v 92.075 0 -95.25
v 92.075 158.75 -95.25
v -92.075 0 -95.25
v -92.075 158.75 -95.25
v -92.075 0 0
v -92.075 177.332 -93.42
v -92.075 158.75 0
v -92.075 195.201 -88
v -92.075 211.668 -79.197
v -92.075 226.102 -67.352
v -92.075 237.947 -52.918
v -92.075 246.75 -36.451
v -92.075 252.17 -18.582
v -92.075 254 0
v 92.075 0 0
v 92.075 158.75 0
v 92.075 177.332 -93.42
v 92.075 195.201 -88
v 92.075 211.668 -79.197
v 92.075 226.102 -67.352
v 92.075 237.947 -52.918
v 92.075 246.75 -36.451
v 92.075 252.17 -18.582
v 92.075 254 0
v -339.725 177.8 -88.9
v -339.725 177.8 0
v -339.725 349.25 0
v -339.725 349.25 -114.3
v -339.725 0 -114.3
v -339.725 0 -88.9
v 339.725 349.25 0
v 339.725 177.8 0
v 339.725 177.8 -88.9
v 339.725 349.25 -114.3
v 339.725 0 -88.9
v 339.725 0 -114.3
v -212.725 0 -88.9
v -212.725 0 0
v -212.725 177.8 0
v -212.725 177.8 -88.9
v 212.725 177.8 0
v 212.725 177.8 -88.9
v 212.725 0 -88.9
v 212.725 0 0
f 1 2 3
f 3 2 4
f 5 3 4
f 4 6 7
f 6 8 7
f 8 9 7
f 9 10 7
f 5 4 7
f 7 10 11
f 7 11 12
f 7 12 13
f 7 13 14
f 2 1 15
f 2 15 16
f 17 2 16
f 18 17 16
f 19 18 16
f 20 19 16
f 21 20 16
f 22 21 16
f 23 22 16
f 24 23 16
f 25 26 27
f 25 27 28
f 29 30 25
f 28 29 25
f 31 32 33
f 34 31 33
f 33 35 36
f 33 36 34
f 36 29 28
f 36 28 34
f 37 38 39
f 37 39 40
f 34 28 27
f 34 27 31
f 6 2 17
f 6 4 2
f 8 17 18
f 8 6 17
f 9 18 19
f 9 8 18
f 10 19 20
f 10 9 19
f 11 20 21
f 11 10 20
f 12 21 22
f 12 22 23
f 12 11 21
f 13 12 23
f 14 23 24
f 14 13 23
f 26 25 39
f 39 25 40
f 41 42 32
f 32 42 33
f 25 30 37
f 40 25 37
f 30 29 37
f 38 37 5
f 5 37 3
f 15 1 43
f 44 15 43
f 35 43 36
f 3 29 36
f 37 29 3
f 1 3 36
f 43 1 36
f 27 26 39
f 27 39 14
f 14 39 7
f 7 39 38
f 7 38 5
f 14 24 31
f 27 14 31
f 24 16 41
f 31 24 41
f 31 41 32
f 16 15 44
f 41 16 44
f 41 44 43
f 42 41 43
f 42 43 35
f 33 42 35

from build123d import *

# Parameters (mm, degrees)
SKETCH1_W           = 679.45
SKETCH1_H           = 114.3
BOSS_EXTRUDE1_DEPTH = 349.25
SKETCH4_W           = 184.15
SKETCH4_H           = 95.25
SKETCH5_W           = 127
SKETCH5_H           = 88.9
CUT_EXTRUDE1_DEPTH  = 177.8


with BuildPart() as part:
    # Sketch1 → Boss-Extrude1 (new body)
    with BuildSketch(Plane(origin=(0, 0, 0), x_dir=(1, 0, 0), z_dir=(0, 1, 0))):
        with Locations((0, 57.15)):
            Rectangle(SKETCH1_W, SKETCH1_H)
    extrude(amount=BOSS_EXTRUDE1_DEPTH)

    # Cut-Sweep4: sweep along a path in Sketch2
    with BuildLine(Plane(origin=(0, 0, 0), x_dir=(0, 0, -1), z_dir=(1, 0, 0))) as cut_sweep4_path:
        Line((47.625, 0), (47.625, 158.75))
        ThreePointArc((47.625, 158.75), (33.675960454, 192.425960454), (0, 206.375))
        Line((0, 206.375), (-25.4, 206.375))
    # Sketch4 → Cut-Sweep4 (sweep, cut)
    with BuildSketch(Plane(origin=(0, 0, 0), x_dir=(1, 0, 0), z_dir=(0, 1, 0))):
        with Locations((0, 47.625)):
            Rectangle(SKETCH4_W, SKETCH4_H)
    sweep(path=cut_sweep4_path.line, mode=Mode.SUBTRACT)

    # Sketch5 → Cut-Extrude1 (cut)
    with BuildSketch(Plane(origin=(0, 0, 0), x_dir=(1, 0, 0), z_dir=(0, 1, 0))):
        with Locations((-276.225, 44.45)):
            Rectangle(SKETCH5_W, SKETCH5_H)
        with Locations((276.225, 44.45)):
            Rectangle(SKETCH5_W, SKETCH5_H)
    extrude(amount=CUT_EXTRUDE1_DEPTH, mode=Mode.SUBTRACT)


solid = part.part
